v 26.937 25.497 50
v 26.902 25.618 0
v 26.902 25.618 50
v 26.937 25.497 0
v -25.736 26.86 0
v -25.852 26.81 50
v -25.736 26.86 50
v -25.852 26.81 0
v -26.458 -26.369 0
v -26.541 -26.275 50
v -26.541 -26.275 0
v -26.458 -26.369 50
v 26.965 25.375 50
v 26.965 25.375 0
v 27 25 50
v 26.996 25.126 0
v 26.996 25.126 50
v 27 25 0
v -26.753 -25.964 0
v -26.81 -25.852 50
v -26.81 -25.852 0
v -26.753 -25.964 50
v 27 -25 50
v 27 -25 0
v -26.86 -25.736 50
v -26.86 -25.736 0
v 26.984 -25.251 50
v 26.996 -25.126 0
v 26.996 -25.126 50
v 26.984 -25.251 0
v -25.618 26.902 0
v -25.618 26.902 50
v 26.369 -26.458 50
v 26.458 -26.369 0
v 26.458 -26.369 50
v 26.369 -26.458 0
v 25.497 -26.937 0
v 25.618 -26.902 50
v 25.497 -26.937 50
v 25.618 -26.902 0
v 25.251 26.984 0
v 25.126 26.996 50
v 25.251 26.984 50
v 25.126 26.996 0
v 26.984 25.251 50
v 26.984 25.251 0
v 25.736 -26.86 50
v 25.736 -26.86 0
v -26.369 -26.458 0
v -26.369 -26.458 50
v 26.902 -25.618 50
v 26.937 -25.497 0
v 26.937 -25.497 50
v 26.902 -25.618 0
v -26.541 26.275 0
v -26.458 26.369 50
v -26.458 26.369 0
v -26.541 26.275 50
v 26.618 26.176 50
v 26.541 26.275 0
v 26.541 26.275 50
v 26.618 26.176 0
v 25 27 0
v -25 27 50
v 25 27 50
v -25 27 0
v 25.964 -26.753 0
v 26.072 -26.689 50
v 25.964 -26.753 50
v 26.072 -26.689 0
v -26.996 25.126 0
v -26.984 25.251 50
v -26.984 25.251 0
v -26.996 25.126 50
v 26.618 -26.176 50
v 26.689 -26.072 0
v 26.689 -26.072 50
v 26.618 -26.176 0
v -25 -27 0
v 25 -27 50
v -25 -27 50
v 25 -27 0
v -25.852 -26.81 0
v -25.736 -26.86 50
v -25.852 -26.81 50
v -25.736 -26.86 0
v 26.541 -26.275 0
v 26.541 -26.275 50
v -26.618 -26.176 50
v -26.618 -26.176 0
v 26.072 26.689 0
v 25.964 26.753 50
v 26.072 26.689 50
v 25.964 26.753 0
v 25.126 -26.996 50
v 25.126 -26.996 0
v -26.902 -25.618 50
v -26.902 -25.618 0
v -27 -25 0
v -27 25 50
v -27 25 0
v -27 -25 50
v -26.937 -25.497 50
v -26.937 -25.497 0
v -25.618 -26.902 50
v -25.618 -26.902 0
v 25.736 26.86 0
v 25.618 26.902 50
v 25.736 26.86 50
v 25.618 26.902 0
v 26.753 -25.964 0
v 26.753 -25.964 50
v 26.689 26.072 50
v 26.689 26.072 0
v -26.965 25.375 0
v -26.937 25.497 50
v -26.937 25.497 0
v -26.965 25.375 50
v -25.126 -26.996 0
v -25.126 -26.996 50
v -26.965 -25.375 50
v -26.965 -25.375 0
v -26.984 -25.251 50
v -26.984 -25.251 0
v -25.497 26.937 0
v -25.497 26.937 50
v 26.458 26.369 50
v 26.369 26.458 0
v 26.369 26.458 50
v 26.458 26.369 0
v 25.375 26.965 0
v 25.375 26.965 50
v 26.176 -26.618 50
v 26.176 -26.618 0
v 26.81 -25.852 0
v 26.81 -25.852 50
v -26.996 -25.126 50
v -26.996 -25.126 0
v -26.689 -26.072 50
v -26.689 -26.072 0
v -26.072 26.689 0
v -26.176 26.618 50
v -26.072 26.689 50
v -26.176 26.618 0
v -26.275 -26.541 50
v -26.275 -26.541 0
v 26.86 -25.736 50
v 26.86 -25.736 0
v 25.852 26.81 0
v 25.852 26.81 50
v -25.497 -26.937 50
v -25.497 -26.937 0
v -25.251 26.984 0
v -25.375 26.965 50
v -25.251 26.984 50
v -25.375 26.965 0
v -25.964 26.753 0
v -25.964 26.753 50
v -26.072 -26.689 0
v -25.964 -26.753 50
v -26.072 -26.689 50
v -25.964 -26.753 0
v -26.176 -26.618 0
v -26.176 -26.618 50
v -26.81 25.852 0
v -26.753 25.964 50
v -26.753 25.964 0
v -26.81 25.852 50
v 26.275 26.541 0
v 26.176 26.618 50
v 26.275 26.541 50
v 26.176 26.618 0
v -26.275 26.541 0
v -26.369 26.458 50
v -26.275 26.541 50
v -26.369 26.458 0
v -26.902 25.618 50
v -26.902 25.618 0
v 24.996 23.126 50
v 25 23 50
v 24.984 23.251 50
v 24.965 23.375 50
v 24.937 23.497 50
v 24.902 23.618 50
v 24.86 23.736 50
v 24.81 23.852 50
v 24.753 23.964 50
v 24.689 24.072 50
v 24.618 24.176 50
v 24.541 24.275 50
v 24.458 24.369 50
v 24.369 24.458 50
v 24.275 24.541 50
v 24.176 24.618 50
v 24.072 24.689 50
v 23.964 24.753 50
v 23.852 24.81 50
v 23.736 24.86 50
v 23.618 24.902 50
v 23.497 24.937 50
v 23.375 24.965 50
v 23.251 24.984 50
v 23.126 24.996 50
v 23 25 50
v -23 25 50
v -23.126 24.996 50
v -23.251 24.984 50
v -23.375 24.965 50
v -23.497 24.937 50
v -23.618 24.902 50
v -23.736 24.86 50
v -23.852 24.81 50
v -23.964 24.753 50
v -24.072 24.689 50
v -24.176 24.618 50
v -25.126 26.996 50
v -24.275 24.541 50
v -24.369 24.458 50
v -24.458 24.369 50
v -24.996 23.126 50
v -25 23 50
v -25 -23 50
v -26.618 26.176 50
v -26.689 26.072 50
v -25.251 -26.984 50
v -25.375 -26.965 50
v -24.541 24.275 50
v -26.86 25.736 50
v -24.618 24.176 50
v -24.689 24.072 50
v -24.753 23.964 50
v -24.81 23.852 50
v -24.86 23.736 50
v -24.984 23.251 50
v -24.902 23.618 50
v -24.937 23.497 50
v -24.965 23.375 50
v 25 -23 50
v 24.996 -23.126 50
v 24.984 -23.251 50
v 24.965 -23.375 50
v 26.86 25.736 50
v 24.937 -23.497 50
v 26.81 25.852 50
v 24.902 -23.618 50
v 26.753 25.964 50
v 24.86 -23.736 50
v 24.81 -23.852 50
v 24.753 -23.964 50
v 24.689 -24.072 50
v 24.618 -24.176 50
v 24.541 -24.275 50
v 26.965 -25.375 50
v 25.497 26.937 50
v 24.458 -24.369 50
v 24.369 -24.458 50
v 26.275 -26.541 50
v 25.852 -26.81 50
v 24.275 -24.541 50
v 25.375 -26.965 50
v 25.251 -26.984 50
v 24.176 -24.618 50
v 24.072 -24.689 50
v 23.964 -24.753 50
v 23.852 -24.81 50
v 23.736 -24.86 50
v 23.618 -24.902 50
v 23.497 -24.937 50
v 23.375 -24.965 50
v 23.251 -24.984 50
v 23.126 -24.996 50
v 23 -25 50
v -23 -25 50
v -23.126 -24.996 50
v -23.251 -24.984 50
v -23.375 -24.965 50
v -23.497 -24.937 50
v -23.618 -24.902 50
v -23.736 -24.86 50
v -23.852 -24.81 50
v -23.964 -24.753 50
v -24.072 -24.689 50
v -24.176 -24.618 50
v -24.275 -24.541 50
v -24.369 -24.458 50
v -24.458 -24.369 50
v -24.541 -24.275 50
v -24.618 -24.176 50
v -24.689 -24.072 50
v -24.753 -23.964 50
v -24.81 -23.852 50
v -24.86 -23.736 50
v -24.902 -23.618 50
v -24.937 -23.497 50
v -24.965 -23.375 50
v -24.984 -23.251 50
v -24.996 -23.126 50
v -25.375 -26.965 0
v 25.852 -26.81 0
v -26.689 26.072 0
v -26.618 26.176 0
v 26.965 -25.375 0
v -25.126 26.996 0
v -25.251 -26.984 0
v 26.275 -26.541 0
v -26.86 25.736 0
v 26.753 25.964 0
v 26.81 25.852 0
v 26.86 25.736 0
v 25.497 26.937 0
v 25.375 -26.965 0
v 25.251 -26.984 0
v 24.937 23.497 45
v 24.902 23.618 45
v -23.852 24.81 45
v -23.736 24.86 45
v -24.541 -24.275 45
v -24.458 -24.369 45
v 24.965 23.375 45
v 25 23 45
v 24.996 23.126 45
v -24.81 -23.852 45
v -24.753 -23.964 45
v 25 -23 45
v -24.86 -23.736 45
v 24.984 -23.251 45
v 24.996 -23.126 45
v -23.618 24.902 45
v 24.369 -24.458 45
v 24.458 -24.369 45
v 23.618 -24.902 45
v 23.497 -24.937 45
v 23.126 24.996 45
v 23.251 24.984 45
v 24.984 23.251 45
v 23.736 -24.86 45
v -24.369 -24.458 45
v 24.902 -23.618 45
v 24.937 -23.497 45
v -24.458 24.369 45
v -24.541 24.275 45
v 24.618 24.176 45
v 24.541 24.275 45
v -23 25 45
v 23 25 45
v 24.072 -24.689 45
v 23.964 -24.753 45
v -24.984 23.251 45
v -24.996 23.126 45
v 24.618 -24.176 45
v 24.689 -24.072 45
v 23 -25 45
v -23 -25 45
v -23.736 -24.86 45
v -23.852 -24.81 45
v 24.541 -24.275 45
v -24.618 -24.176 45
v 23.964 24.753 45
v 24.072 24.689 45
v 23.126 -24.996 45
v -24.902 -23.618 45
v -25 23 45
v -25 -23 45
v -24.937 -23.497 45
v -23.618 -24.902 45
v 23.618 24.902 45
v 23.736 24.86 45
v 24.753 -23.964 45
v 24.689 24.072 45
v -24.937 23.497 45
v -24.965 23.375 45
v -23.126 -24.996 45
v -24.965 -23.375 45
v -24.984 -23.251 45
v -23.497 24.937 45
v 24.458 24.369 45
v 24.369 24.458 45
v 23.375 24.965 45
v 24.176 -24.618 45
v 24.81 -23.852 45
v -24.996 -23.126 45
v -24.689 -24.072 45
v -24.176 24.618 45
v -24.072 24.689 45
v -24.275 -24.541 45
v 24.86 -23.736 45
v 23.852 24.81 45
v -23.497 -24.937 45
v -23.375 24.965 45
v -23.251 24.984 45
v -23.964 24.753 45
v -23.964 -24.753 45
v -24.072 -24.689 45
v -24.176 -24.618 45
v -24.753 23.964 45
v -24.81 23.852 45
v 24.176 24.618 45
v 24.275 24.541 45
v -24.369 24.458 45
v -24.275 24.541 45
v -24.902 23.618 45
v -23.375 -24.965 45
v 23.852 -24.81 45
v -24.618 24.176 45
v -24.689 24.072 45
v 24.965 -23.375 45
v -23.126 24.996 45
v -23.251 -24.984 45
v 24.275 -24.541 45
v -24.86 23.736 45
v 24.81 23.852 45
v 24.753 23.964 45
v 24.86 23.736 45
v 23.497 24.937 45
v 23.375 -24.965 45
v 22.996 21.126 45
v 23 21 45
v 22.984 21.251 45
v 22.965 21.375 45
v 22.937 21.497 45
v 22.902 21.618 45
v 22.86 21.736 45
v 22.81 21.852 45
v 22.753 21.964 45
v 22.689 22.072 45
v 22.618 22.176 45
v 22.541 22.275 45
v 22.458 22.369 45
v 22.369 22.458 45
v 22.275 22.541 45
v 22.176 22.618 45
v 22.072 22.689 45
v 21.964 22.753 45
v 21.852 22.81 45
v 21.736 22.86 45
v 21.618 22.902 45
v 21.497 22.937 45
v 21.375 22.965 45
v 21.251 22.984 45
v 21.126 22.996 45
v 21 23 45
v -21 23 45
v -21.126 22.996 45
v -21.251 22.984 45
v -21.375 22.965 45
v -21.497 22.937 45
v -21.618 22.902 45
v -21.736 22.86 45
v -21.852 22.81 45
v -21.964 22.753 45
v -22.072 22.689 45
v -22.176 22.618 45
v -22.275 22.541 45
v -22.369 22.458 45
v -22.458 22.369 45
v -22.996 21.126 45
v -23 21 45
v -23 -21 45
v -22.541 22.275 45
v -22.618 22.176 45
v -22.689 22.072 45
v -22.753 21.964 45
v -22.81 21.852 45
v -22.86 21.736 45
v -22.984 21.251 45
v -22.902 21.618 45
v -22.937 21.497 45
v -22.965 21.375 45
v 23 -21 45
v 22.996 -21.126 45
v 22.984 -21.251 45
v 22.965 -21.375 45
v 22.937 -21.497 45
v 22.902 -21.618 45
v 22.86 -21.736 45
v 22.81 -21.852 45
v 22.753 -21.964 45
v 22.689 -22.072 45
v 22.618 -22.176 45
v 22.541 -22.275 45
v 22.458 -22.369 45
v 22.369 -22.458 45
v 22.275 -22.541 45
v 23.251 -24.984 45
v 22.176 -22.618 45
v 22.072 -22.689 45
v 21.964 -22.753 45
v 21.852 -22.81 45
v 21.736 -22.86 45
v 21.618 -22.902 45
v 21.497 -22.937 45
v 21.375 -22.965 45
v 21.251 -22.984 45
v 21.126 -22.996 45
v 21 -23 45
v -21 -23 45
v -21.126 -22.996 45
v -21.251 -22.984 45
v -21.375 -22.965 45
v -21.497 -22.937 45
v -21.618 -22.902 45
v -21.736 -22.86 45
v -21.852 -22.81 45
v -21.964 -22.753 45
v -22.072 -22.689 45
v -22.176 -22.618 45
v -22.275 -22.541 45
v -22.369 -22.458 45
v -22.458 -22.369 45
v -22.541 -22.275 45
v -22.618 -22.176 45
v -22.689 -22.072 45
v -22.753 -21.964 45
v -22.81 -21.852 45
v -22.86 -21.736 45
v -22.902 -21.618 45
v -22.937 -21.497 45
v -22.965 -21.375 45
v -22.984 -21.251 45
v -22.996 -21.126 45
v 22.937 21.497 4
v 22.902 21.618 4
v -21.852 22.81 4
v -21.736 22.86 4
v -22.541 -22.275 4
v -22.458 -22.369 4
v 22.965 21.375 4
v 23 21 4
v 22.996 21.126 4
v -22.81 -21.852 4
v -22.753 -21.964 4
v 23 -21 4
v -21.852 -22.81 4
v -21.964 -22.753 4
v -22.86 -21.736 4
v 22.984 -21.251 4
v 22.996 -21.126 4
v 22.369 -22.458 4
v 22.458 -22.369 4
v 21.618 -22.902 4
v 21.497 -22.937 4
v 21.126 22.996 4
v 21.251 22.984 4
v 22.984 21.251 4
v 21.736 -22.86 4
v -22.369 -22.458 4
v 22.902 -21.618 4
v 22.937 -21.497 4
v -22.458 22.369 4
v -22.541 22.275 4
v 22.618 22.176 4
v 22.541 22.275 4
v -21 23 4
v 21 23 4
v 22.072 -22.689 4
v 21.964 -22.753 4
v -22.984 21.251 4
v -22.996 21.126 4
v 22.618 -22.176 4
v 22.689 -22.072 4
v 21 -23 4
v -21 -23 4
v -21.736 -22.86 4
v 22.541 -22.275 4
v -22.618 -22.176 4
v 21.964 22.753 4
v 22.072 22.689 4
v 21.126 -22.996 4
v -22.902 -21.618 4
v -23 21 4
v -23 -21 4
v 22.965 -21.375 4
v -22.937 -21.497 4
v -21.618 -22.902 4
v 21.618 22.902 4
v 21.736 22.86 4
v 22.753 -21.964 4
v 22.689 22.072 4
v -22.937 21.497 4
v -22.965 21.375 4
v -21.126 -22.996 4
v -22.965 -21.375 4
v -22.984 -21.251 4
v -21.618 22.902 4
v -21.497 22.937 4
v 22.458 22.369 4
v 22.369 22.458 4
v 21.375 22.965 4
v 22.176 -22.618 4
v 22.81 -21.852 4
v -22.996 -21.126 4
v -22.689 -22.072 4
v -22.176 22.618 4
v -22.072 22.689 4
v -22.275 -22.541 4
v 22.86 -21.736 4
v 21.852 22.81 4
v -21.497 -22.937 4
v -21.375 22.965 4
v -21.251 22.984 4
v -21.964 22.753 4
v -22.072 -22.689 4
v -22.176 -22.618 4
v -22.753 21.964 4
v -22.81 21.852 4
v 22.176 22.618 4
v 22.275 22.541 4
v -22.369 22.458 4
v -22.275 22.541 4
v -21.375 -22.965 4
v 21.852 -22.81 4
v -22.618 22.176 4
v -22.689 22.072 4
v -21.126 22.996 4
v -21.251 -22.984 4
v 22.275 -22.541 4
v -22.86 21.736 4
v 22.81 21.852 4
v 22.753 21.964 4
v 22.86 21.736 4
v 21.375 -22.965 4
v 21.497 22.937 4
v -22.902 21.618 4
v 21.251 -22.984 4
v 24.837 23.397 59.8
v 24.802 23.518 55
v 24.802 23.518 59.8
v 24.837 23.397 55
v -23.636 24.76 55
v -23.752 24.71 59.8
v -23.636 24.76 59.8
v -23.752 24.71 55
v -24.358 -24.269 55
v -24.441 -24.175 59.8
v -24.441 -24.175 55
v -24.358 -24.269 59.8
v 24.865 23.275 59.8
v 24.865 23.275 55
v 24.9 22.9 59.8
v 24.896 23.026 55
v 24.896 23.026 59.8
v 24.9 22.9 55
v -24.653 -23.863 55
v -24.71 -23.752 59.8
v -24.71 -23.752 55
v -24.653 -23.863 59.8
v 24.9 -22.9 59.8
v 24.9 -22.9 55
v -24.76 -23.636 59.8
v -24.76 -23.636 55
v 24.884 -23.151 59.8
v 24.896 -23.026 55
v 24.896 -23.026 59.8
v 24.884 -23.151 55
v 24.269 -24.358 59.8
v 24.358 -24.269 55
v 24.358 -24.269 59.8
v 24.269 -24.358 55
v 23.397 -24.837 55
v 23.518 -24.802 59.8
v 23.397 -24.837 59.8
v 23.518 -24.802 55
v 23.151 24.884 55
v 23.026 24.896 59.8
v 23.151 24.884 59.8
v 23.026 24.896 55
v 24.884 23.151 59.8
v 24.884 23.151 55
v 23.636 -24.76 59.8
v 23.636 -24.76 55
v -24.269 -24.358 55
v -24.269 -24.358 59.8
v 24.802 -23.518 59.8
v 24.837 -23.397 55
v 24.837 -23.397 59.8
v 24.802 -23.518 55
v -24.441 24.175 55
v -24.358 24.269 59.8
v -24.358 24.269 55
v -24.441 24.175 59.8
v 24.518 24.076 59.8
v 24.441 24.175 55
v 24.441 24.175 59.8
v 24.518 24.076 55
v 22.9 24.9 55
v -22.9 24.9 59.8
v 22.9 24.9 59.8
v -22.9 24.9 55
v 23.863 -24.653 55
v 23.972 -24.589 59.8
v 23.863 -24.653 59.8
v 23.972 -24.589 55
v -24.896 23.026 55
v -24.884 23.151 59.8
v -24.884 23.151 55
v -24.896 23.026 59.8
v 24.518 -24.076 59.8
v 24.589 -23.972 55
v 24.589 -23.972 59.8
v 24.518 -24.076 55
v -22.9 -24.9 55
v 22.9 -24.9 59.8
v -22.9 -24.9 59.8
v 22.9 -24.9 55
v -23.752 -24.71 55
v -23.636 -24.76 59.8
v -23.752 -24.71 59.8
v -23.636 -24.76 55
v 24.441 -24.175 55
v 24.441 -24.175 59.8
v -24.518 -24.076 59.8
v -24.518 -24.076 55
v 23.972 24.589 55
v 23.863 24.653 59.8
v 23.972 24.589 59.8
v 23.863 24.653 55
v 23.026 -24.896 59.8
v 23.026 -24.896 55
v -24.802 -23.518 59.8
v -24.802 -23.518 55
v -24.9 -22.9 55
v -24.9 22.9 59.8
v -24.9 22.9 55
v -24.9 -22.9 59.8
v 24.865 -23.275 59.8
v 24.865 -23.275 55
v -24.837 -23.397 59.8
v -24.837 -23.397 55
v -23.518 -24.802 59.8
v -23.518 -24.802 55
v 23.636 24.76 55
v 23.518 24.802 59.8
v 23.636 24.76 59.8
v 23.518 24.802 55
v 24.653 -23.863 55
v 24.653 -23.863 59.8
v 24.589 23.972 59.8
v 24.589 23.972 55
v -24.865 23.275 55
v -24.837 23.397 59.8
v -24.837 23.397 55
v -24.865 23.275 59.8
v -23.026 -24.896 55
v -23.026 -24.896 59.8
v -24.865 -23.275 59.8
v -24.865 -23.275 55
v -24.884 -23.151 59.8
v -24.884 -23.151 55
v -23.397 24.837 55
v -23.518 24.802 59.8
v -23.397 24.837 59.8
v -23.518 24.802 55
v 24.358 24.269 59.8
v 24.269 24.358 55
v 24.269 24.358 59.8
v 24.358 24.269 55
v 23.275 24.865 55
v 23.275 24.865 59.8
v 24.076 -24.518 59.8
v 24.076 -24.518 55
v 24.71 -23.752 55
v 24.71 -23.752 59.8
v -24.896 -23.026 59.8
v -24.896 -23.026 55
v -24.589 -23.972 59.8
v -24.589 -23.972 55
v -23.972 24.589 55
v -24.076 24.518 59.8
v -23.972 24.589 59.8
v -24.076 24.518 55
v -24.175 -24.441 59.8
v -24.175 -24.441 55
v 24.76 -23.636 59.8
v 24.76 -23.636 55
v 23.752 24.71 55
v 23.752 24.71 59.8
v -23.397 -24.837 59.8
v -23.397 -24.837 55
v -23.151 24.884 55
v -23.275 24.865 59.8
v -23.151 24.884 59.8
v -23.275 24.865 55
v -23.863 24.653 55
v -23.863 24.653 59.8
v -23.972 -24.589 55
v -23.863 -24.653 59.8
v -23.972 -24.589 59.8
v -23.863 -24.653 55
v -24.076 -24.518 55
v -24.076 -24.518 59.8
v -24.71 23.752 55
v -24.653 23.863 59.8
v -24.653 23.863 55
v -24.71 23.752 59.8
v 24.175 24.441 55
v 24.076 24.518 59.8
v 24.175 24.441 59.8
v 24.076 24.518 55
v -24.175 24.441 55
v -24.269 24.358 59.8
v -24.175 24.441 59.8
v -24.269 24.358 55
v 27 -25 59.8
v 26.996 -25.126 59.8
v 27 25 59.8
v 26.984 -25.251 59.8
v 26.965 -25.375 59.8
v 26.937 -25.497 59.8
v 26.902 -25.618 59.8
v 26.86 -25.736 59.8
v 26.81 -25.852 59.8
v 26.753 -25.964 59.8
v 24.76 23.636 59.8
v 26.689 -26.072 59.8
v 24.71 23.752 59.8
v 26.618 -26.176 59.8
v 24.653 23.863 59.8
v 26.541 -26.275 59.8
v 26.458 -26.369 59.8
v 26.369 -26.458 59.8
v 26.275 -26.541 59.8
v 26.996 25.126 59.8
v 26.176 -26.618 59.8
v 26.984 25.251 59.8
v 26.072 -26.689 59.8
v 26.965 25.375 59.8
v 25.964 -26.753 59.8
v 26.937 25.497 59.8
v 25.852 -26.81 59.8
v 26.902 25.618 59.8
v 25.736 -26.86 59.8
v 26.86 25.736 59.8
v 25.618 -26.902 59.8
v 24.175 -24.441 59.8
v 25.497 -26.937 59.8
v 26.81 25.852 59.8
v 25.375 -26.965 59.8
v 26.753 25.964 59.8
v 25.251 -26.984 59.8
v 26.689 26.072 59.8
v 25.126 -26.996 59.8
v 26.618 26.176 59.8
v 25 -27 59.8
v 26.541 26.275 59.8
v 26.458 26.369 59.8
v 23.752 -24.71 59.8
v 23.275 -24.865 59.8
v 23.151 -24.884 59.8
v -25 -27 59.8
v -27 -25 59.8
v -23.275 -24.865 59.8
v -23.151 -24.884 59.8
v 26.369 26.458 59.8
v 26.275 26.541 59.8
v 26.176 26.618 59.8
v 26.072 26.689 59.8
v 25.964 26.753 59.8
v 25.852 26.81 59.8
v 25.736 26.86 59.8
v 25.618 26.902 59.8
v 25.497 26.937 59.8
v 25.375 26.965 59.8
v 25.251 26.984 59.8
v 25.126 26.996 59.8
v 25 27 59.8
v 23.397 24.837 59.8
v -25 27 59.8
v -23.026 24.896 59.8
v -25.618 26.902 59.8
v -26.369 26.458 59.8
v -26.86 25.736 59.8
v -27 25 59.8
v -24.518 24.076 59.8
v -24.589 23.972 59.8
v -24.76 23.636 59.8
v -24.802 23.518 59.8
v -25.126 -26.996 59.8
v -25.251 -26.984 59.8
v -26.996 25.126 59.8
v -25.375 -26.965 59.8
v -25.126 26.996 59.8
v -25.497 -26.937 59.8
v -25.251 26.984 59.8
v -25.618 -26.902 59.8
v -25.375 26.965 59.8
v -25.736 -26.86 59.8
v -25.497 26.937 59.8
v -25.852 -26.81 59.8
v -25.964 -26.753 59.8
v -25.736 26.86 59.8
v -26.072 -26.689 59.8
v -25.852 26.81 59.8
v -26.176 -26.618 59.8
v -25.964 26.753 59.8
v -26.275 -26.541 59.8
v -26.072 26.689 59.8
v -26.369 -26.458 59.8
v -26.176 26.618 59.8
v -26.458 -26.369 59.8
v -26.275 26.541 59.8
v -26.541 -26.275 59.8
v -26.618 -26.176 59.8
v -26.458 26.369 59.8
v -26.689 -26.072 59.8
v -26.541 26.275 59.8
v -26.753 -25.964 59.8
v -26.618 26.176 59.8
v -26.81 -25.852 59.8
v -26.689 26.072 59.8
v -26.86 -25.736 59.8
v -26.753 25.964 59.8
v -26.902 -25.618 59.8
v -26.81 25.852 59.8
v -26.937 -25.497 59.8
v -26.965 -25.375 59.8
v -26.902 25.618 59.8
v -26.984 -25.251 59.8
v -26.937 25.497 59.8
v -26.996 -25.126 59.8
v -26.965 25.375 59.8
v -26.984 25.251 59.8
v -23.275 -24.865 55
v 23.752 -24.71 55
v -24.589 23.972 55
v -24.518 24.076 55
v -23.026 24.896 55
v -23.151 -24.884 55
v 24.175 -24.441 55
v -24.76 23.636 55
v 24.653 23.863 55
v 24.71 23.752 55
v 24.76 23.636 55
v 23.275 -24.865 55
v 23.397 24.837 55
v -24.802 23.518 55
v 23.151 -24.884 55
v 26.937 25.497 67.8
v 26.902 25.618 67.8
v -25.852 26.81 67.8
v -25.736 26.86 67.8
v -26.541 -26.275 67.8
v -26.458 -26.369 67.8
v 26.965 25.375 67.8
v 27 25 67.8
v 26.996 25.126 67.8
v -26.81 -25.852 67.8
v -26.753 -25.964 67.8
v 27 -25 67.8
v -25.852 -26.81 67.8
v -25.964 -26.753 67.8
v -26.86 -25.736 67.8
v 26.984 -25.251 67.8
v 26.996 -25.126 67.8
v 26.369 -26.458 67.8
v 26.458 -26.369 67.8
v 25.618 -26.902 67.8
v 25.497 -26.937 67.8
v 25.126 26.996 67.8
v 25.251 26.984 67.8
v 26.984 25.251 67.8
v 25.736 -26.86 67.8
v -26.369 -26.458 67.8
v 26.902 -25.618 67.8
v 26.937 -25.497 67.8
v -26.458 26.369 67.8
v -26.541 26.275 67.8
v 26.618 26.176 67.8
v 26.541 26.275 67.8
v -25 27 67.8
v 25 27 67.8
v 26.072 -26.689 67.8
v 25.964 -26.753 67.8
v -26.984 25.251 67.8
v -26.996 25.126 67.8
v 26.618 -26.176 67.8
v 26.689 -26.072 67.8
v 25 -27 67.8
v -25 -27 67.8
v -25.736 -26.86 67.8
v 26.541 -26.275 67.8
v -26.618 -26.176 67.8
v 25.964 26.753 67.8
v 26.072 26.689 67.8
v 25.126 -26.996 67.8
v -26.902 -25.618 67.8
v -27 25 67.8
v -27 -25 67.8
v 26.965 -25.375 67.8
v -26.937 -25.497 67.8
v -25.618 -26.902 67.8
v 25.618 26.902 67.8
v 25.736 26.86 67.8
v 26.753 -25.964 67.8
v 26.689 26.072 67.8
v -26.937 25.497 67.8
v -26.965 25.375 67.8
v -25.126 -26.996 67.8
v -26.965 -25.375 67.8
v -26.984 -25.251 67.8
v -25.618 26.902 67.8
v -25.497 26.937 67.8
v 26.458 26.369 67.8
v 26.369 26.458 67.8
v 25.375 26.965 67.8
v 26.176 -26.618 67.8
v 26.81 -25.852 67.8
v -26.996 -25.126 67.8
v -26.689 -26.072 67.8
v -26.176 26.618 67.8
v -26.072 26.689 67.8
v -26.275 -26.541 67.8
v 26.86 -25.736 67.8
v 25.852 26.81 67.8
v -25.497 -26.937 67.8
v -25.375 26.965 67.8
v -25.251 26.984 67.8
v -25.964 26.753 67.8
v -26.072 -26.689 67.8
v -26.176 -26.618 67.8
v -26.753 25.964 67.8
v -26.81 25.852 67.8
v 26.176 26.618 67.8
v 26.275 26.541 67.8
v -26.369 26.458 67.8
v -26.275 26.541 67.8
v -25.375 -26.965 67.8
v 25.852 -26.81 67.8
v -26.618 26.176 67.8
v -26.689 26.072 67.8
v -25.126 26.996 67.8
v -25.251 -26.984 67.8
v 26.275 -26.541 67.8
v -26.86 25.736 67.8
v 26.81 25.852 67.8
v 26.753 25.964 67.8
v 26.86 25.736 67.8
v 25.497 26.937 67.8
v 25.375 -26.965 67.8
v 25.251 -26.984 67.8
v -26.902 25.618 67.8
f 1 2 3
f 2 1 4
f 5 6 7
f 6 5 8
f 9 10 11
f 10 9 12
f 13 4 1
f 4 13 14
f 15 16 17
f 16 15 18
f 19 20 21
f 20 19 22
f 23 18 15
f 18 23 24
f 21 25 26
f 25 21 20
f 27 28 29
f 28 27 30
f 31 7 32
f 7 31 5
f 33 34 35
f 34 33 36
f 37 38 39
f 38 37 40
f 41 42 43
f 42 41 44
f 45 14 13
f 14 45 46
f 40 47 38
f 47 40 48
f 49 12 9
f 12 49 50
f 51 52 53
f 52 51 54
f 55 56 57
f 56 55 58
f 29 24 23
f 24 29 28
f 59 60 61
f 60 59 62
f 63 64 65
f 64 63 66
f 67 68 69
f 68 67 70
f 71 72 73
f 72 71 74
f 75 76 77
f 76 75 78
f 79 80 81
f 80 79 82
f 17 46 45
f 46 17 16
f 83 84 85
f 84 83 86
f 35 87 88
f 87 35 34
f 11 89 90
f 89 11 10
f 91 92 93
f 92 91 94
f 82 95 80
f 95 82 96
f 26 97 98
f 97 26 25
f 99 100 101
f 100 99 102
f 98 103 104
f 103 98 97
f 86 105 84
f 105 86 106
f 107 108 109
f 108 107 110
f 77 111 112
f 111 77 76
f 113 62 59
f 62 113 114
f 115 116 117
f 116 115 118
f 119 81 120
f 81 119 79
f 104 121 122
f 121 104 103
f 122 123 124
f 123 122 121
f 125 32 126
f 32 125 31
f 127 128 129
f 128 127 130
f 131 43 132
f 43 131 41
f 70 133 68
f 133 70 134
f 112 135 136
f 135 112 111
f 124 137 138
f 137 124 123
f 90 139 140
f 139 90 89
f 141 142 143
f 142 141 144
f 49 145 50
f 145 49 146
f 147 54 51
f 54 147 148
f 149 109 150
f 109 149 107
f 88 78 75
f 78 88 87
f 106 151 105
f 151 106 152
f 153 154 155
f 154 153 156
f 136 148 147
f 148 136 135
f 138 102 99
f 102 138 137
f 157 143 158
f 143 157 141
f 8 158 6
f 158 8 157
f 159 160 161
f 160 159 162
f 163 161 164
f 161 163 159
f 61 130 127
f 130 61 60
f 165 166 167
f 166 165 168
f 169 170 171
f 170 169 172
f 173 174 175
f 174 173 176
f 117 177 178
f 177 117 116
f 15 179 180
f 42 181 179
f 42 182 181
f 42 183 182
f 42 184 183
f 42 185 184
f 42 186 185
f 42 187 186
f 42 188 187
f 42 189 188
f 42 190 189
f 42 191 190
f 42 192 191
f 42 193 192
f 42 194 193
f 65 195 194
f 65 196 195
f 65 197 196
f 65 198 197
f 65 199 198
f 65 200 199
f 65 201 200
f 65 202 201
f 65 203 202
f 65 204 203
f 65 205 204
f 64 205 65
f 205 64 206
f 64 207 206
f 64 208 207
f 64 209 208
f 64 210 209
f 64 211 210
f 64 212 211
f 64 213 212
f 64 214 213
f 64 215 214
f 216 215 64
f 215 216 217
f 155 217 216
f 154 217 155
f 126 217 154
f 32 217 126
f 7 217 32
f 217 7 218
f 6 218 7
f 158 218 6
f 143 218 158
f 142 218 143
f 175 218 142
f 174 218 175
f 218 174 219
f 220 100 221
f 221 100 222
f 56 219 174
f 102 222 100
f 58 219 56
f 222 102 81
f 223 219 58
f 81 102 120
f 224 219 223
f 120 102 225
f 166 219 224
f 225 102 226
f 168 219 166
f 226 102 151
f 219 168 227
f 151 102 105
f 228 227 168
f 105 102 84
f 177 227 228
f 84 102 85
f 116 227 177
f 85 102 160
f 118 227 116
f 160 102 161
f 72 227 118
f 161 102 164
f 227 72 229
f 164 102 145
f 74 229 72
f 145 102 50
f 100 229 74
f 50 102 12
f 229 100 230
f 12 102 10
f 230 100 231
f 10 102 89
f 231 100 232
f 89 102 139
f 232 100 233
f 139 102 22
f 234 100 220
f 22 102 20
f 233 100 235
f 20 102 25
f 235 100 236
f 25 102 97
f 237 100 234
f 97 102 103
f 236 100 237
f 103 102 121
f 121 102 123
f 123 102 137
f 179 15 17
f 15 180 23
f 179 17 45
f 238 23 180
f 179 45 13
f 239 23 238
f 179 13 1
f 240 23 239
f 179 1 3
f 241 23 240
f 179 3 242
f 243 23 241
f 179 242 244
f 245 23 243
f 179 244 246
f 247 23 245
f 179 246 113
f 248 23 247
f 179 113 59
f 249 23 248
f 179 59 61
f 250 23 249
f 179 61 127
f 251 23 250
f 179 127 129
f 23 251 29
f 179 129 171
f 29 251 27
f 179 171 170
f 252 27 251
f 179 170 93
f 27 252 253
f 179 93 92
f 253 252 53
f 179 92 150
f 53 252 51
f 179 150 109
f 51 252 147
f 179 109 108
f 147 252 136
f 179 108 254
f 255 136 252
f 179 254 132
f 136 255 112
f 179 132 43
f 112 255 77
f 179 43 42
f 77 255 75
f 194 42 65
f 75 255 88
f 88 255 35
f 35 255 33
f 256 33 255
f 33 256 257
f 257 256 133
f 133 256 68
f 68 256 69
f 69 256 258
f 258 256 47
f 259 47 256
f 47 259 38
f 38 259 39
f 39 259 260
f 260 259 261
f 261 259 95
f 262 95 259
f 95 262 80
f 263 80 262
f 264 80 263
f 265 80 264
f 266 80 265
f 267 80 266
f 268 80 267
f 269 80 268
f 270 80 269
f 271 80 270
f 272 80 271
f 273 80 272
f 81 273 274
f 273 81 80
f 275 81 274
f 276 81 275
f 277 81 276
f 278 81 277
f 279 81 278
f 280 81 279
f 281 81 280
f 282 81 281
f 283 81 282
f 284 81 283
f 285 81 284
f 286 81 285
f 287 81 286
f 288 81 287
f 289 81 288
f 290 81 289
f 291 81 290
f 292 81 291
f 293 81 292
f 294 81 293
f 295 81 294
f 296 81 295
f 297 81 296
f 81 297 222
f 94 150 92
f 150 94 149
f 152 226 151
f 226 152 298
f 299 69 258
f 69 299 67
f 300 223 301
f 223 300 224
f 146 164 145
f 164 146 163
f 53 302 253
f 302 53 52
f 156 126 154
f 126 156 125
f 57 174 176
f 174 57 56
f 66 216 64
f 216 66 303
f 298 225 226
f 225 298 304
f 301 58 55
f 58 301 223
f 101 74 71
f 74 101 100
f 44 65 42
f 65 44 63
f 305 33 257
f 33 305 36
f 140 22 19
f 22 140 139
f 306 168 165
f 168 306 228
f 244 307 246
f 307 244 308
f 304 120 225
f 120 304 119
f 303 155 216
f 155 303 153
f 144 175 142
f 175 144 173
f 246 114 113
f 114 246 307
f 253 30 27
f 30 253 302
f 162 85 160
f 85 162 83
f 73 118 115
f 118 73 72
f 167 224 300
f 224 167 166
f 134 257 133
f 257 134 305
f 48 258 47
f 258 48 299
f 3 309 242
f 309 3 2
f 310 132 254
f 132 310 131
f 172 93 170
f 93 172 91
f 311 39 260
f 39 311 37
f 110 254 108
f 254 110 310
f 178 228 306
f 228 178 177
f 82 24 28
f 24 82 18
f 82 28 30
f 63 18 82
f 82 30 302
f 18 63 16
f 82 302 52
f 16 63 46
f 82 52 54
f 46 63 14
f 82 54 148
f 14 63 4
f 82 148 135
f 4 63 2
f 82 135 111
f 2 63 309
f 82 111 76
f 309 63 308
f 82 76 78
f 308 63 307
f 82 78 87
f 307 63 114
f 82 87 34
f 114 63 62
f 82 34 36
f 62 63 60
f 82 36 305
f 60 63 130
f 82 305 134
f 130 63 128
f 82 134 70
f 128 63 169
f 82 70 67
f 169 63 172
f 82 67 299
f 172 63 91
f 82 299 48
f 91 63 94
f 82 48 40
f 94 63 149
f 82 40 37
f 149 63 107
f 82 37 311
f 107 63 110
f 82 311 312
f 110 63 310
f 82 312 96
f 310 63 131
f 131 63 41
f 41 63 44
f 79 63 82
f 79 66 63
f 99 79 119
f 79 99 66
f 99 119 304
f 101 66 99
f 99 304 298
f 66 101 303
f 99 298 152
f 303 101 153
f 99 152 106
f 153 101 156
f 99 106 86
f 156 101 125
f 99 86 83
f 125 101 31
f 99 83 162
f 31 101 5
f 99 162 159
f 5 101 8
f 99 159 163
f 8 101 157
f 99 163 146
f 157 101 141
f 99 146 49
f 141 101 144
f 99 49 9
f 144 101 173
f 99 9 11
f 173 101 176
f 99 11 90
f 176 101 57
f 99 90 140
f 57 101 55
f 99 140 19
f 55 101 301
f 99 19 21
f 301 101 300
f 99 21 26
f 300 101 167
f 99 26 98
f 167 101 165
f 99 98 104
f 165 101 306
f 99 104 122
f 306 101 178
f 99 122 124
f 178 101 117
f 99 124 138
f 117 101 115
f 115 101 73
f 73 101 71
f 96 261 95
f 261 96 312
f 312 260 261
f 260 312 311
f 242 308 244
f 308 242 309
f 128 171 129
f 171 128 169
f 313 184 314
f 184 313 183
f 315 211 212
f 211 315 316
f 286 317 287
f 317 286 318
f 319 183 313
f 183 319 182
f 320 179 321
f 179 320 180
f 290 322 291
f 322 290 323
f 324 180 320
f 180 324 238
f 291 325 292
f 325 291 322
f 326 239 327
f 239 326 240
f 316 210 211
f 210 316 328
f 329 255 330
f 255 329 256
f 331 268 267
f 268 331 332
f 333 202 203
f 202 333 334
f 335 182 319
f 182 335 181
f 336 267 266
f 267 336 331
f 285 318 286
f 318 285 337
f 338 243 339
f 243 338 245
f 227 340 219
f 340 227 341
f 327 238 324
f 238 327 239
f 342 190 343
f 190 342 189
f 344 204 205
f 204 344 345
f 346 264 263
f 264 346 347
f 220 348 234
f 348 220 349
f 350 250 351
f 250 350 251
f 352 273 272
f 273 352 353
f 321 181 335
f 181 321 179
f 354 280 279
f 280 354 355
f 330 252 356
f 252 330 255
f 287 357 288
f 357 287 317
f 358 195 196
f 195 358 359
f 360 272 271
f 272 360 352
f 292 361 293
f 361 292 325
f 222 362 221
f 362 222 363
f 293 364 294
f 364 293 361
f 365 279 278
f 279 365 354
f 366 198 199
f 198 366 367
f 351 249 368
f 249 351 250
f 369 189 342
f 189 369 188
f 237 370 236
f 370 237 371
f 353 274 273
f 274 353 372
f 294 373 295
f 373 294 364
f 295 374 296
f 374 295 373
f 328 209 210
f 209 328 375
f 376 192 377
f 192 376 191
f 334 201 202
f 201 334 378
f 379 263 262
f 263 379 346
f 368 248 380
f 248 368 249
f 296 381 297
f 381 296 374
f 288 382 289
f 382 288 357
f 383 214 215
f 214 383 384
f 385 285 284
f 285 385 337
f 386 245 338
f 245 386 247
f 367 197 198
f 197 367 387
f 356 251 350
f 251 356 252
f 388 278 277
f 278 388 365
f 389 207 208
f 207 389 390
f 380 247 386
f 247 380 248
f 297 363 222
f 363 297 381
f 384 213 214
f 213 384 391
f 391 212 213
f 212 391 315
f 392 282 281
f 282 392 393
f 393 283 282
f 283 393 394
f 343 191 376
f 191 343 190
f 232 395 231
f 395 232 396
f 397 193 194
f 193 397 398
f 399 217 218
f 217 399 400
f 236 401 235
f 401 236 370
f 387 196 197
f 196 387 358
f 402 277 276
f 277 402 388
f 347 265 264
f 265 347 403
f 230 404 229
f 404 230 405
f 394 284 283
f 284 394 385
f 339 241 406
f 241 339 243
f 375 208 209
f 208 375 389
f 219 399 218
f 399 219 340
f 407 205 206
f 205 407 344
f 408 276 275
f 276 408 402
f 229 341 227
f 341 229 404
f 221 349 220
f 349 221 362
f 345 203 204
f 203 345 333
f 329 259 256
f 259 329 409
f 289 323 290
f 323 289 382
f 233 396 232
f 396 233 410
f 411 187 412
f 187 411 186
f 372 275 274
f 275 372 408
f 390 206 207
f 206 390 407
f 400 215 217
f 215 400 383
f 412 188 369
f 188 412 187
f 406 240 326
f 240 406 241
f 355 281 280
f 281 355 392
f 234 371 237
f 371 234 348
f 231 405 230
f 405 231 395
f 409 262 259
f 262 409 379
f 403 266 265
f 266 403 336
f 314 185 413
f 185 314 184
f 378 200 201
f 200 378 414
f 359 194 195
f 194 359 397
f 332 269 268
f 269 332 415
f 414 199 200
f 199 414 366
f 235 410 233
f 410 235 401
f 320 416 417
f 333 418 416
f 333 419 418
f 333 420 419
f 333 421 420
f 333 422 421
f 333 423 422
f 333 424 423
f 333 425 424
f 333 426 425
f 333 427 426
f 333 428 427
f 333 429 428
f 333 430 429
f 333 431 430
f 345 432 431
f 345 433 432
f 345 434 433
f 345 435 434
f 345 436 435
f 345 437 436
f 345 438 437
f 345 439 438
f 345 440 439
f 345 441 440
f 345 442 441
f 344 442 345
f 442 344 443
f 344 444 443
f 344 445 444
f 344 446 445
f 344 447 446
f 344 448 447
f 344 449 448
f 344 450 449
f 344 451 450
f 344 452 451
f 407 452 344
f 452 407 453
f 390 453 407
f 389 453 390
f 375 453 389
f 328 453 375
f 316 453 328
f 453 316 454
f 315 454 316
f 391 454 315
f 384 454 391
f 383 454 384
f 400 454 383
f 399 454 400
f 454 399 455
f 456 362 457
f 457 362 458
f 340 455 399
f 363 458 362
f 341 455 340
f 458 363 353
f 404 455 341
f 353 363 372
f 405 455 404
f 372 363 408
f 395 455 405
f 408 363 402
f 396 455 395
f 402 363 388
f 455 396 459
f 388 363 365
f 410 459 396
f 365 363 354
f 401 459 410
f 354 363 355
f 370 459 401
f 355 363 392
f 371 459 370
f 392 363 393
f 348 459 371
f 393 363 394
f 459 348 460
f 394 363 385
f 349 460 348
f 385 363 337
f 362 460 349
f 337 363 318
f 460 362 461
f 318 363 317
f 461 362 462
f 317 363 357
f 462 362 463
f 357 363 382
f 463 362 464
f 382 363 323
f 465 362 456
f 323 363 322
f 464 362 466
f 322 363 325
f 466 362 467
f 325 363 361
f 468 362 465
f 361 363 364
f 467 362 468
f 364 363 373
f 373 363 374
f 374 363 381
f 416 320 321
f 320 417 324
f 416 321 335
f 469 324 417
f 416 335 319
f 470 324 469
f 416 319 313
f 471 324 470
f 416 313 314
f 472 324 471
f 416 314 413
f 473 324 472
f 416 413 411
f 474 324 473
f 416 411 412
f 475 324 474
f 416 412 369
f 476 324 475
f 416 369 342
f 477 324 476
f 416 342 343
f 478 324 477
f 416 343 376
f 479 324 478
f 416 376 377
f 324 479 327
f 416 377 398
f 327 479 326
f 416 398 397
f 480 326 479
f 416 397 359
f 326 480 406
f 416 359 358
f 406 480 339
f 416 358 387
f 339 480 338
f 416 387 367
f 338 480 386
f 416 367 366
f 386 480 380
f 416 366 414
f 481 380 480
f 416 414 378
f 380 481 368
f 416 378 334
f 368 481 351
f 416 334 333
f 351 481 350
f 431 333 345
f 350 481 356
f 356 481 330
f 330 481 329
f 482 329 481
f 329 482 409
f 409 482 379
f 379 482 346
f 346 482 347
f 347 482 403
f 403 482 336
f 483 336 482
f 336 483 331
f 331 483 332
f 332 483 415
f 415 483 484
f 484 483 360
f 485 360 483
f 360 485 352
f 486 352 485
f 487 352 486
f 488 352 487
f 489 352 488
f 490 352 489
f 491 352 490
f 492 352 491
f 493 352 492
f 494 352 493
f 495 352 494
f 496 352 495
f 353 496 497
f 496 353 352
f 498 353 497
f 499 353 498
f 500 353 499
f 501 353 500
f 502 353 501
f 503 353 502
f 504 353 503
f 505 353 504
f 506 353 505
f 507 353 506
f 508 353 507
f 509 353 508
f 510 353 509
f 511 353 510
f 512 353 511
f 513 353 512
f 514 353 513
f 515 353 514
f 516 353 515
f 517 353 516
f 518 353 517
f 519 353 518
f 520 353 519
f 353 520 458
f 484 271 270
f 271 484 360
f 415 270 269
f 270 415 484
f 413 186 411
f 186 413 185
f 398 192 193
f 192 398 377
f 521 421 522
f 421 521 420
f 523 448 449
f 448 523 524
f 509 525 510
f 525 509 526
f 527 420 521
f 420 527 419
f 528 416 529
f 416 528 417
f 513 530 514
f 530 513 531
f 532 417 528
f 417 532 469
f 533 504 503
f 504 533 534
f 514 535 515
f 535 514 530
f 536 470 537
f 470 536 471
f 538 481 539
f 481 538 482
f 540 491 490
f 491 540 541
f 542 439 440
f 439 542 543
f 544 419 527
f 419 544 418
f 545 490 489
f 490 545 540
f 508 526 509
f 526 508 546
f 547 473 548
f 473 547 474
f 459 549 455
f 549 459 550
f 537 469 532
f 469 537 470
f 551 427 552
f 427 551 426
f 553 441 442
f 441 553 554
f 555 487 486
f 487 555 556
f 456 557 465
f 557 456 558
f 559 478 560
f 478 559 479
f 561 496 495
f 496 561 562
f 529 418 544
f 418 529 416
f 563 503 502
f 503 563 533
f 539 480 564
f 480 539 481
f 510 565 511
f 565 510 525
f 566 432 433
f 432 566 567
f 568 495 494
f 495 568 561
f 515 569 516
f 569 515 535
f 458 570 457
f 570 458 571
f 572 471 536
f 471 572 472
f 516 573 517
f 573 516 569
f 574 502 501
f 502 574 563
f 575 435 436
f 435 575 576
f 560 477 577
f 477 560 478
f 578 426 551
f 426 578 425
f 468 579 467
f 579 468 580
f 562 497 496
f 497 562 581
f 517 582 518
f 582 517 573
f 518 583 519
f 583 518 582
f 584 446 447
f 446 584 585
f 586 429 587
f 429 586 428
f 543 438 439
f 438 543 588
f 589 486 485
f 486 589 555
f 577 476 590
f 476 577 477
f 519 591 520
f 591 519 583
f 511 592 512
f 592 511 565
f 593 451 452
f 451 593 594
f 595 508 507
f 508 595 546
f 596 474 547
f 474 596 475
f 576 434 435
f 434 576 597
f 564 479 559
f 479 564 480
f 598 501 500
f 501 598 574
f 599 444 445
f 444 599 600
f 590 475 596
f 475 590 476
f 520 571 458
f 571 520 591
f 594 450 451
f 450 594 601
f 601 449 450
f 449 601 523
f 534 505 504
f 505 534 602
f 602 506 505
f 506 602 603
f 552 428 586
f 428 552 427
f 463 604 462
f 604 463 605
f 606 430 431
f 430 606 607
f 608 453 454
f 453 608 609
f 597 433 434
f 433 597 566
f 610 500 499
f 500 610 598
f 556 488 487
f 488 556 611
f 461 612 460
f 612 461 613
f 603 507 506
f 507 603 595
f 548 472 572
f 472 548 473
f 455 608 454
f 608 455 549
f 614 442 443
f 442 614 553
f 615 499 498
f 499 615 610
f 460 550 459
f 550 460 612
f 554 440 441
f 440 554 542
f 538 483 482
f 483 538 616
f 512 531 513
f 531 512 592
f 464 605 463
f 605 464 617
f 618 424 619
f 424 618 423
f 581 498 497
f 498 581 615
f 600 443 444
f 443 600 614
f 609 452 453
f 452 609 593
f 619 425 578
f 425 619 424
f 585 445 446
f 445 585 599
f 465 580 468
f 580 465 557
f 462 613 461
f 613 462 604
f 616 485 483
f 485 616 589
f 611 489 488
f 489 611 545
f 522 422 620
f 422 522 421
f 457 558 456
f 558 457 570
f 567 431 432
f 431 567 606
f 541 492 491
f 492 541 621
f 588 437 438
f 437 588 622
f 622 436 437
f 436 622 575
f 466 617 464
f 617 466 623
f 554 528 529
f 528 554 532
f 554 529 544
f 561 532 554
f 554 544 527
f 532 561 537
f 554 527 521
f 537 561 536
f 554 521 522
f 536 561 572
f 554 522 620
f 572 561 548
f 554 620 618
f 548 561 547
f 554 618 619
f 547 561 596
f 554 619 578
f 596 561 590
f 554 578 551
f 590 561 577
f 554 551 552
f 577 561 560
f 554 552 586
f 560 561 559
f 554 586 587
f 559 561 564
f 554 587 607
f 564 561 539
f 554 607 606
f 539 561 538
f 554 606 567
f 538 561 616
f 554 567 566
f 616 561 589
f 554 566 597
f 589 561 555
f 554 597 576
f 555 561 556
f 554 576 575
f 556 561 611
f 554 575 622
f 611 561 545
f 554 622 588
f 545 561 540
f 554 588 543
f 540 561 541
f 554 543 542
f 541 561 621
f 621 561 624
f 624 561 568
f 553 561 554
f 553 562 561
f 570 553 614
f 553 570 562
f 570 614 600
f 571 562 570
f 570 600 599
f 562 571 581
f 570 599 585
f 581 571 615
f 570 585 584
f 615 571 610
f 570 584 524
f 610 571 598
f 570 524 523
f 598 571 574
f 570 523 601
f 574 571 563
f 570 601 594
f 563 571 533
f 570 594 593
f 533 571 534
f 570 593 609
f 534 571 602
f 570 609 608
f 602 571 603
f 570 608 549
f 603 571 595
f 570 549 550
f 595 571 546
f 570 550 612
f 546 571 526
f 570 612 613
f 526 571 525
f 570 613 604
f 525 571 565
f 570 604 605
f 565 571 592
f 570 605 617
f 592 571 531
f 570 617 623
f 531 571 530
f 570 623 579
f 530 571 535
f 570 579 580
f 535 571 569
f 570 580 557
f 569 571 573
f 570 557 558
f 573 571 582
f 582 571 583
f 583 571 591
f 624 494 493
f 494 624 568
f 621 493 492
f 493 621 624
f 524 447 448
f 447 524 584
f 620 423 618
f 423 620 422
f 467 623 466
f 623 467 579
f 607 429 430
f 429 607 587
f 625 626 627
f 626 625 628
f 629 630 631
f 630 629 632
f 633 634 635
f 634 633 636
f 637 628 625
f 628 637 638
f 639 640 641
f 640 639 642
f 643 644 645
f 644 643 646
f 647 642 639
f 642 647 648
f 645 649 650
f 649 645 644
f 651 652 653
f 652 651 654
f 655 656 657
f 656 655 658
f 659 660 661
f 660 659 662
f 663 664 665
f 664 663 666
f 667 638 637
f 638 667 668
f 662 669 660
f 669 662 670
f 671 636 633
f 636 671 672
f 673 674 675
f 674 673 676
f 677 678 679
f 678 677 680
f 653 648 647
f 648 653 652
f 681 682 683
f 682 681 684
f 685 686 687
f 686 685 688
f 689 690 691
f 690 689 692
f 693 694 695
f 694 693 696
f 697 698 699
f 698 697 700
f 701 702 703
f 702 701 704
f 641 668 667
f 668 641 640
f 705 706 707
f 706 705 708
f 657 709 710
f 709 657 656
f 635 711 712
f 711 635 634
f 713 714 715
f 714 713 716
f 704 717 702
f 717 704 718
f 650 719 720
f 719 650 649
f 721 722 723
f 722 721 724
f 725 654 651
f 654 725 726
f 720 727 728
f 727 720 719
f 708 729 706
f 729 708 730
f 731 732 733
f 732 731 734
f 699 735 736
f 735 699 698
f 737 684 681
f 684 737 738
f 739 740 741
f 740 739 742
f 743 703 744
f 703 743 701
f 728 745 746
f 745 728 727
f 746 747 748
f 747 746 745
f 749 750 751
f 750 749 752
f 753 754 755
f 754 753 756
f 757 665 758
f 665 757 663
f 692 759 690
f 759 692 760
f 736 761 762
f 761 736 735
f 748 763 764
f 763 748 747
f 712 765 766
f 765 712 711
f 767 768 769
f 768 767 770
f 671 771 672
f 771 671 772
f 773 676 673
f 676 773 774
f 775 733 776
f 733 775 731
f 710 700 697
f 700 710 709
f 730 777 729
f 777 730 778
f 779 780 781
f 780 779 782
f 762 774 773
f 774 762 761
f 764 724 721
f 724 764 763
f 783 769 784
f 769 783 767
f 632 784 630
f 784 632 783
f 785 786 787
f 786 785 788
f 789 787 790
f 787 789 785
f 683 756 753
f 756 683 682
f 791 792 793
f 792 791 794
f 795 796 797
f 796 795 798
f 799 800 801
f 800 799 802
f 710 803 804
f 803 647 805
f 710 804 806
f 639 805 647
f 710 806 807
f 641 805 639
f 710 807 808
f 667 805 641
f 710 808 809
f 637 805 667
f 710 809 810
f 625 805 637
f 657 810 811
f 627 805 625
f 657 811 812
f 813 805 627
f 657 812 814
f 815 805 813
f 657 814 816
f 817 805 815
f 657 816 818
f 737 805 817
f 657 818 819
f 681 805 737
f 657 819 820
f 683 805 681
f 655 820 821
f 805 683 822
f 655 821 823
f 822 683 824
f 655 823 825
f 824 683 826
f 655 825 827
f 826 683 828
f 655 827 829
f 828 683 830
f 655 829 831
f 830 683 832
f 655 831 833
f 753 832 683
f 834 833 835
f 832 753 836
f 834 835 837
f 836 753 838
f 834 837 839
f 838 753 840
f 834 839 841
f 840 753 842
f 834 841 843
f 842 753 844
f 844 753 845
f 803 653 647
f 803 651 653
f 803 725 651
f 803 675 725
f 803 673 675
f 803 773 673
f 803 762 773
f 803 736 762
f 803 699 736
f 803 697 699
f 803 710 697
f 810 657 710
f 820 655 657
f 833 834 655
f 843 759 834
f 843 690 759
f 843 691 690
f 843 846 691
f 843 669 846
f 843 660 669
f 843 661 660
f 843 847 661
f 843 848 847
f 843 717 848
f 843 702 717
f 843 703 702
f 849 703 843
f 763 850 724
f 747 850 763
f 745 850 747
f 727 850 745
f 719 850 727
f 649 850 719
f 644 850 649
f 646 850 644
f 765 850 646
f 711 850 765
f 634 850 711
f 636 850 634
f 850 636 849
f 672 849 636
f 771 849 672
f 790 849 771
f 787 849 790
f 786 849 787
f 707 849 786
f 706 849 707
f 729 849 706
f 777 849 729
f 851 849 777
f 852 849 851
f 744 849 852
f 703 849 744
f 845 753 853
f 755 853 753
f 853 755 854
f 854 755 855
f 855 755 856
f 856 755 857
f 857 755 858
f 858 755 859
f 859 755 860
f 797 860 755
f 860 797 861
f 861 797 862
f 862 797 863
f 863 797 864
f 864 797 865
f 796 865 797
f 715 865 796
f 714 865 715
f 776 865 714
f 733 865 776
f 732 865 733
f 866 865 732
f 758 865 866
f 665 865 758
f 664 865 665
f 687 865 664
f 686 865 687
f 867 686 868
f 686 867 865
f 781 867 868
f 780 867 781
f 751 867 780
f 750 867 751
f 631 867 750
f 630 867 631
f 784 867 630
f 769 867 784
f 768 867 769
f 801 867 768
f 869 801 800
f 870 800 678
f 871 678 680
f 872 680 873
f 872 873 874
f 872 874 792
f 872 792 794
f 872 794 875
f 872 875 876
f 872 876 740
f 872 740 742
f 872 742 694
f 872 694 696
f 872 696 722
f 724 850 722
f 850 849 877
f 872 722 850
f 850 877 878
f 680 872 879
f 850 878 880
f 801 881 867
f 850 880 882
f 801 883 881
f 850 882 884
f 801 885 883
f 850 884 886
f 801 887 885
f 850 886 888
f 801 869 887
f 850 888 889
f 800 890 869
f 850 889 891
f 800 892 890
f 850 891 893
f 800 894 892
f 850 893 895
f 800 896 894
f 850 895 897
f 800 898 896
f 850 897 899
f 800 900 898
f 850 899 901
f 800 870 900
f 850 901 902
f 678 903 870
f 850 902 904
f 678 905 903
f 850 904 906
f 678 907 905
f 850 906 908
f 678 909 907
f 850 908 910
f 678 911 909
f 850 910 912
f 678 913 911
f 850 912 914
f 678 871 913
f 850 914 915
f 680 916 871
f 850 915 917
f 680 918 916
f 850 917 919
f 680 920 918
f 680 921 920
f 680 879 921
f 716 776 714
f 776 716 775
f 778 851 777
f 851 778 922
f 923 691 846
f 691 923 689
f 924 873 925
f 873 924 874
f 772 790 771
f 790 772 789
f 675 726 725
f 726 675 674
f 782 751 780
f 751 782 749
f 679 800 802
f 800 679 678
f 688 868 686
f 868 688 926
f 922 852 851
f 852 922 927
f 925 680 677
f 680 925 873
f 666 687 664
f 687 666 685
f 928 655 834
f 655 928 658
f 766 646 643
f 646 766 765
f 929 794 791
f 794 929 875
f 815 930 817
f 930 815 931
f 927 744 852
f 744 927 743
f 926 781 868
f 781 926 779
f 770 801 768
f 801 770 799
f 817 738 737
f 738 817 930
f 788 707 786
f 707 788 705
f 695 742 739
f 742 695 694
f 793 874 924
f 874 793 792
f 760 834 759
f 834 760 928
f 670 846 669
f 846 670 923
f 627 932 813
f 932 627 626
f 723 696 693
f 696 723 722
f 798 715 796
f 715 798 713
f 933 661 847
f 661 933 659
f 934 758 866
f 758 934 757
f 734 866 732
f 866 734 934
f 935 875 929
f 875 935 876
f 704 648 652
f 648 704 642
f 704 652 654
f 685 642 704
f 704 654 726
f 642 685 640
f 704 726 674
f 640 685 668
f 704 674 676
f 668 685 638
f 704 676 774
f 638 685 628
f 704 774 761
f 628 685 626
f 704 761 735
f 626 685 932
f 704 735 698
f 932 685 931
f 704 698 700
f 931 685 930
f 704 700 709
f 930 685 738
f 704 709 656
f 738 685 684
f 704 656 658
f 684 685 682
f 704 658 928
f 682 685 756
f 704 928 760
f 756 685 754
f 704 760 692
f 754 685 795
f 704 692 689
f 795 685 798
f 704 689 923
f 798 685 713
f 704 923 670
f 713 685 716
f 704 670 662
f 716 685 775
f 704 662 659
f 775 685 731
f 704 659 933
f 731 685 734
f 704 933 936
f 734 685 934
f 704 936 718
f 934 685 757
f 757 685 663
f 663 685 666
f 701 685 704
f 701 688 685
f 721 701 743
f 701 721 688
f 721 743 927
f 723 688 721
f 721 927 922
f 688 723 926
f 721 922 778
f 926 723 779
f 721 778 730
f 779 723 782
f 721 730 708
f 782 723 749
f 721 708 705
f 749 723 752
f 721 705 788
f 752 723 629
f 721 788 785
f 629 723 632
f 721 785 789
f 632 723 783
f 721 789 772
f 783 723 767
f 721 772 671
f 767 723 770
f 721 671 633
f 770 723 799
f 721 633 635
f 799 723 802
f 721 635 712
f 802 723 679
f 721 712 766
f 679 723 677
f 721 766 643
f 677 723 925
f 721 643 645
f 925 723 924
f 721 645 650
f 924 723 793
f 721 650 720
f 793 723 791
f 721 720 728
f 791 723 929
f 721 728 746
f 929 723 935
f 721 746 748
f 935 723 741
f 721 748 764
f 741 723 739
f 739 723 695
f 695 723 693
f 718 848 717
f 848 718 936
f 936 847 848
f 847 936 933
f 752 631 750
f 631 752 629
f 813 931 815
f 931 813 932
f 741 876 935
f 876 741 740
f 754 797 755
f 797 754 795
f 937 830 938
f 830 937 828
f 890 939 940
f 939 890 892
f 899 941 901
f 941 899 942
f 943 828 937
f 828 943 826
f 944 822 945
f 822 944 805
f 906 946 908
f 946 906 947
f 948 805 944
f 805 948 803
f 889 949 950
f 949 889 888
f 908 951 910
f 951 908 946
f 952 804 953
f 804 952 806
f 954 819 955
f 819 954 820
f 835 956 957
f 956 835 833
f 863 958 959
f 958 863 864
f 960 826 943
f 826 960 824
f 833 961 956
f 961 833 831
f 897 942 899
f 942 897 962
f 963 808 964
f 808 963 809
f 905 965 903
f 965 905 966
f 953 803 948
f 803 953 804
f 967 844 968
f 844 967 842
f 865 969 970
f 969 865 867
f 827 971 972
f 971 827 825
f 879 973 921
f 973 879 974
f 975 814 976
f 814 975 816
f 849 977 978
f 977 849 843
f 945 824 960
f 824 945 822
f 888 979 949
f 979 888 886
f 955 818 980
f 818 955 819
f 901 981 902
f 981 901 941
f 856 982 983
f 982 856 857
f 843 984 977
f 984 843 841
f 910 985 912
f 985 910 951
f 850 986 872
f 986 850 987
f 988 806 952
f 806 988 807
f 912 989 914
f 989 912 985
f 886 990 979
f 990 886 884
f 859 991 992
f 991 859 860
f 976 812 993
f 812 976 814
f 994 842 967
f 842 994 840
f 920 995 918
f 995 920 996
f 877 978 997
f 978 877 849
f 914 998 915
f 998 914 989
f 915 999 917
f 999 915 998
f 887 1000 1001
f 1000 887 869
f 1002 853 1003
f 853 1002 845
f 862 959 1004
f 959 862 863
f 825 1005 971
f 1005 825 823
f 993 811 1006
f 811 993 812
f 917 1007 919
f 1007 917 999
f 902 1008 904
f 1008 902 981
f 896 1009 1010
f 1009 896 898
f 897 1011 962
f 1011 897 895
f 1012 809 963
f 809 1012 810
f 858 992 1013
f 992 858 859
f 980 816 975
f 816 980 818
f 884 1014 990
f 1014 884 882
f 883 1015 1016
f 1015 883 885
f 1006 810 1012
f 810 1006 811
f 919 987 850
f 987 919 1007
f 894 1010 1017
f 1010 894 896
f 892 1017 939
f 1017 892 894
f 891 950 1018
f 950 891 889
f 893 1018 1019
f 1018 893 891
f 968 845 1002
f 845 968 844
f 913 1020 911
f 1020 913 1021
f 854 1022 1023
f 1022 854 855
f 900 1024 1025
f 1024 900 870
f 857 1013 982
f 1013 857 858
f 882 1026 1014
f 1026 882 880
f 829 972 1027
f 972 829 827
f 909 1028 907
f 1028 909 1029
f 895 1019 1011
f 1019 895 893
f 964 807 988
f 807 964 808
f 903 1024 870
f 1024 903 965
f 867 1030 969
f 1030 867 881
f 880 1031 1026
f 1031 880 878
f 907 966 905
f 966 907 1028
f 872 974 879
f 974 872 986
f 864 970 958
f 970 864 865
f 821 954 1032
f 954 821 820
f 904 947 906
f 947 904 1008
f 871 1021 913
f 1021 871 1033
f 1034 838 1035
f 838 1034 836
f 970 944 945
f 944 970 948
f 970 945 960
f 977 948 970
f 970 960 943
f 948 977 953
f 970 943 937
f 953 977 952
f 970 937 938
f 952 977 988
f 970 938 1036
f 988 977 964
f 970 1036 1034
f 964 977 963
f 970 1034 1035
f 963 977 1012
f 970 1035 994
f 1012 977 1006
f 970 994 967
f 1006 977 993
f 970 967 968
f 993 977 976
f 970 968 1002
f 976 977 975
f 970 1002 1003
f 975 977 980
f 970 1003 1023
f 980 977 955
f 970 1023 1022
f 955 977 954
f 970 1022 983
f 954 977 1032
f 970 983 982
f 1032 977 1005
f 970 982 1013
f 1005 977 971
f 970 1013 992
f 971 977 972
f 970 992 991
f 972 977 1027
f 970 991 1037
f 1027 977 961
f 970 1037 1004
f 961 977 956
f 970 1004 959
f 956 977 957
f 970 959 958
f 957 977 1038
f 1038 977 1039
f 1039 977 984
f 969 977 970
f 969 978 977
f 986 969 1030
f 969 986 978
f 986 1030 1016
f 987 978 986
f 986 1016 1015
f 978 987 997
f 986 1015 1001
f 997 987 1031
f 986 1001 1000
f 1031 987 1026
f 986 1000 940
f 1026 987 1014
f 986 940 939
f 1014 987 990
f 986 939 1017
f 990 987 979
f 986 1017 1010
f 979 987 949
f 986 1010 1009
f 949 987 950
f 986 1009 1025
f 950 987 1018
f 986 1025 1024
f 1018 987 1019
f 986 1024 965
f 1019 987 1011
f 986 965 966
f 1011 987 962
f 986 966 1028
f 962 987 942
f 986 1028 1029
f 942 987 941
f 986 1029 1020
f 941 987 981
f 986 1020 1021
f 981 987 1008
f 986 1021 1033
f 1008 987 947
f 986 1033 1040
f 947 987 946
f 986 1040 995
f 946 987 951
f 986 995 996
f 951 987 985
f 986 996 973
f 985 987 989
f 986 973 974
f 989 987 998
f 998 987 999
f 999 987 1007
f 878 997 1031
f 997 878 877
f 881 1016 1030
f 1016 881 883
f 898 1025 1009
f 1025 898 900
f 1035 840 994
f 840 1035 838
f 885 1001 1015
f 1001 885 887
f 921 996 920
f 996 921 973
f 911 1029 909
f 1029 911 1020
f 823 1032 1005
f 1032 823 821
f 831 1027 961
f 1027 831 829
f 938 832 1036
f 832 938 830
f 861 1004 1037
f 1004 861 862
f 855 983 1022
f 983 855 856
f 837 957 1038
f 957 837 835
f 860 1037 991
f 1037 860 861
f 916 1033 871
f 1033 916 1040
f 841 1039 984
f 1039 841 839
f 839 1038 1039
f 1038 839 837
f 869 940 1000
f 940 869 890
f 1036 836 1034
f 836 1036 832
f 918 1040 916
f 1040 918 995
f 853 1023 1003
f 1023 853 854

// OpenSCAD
// Minkowski Sum (Dilation)Box
// Author: Akshay V. Dhamankar

// CUSTOMIZER VARIABLES

// Number of Fragments
$fn = 100;

// Box Square Size
square_size = 50;

// Minkowski Dilation Radius
circle_radius = 2;

// Wall Thickness
wall_thickness = 4;

// Box Height
extrude_len = 50;

// Tolerance
tolerance = 0.2;

// Lid Height
lid_height = 8;

// Lid depth
lid_depth = 5;

// CUSTOMIZER VARIABLES END
// Module 1: Base
module minkowski_base() 
{

difference(){
// Main base
linear_extrude(extrude_len)
{
        minkowski()
        {
            square(square_size, center=true);
            circle(circle_radius);
        }
}

translate([0,0,(extrude_len-lid_depth)])
{
    linear_extrude(extrude_len)
    {
        minkowski()
        {
            square((square_size)-(wall_thickness), center=true);
            circle(circle_radius);
        }
    }
}

translate([0,0,wall_thickness])
{
    linear_extrude(extrude_len)
    {
        minkowski()
        {
            square((square_size - (wall_thickness*2)), center=true);
            circle(2);
        }
    }
}
}
}
minkowski_base();

// Module 2: Lid

// Lid Height
//lid_height = 4;

module minkowski_lid() 
{
union()
{
    // Piece that Fits In
    translate([0,0,(extrude_len + 5)])

{
    linear_extrude(lid_depth - tolerance)
    {
        minkowski()
        {
            square(((square_size - wall_thickness)-tolerance), center=true);
            circle(circle_radius);
        }
    }
}
// Piece that Covers the Top
translate([0,0,extrude_len + 5 + (lid_depth-tolerance)])
{
//    linear_extrude(lid_height-(0.45*lid_height))
      linear_extrude(lid_height)
    {
        minkowski()
        {
            square(square_size, center=true);
            circle(circle_radius);
        }
    }
}
}
}
minkowski_lid();
